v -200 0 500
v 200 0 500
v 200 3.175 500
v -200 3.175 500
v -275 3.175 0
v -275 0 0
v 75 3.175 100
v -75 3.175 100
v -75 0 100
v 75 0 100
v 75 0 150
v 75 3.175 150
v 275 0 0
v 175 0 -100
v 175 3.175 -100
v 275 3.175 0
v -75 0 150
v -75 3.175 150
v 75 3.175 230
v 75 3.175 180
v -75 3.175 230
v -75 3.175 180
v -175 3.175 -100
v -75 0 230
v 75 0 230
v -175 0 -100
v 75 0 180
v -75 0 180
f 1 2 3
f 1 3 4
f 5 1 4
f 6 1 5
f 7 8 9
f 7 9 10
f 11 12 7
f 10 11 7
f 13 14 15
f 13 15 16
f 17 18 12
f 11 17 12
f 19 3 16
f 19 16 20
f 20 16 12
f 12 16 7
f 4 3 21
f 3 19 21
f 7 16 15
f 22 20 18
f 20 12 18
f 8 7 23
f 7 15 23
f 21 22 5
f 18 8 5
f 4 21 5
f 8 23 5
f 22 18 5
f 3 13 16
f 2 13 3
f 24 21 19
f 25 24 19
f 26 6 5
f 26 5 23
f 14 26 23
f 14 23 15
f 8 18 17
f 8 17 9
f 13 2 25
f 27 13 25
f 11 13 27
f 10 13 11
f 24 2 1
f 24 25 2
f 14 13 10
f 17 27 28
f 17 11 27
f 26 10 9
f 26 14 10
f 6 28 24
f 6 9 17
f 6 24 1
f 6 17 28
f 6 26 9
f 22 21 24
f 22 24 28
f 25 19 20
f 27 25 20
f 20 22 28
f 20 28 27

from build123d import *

# Parameters (mm, degrees)
BOSS_EXTRUDE1_DEPTH = 3.175
SKETCH2_W           = 150
SKETCH2_H           = 50
CUT_EXTRUDE1_DEPTH  = 10


with BuildPart() as part:
    # Sketch1 → Boss-Extrude1 (new body)
    with BuildSketch(Plane(origin=(0, 0, 0), x_dir=(1, 0, 0), z_dir=(0, 1, 0))):
        Polygon((-175, 100), (175, 100), (275, 0), (200, -500), (-200, -500), (-275, 0), align=None)
    extrude(amount=BOSS_EXTRUDE1_DEPTH)

    # Sketch2 → Cut-Extrude1 (cut)
    with BuildSketch(Plane(origin=(0, 3.175, 0), x_dir=(1, 0, 0), z_dir=(0, 1, 0))):
        with Locations((0, -205)):
            Rectangle(SKETCH2_W, SKETCH2_H)
        with Locations((0, -125)):
            Rectangle(SKETCH2_W, SKETCH2_H)
    extrude(amount=-CUT_EXTRUDE1_DEPTH, mode=Mode.SUBTRACT)


solid = part.part
